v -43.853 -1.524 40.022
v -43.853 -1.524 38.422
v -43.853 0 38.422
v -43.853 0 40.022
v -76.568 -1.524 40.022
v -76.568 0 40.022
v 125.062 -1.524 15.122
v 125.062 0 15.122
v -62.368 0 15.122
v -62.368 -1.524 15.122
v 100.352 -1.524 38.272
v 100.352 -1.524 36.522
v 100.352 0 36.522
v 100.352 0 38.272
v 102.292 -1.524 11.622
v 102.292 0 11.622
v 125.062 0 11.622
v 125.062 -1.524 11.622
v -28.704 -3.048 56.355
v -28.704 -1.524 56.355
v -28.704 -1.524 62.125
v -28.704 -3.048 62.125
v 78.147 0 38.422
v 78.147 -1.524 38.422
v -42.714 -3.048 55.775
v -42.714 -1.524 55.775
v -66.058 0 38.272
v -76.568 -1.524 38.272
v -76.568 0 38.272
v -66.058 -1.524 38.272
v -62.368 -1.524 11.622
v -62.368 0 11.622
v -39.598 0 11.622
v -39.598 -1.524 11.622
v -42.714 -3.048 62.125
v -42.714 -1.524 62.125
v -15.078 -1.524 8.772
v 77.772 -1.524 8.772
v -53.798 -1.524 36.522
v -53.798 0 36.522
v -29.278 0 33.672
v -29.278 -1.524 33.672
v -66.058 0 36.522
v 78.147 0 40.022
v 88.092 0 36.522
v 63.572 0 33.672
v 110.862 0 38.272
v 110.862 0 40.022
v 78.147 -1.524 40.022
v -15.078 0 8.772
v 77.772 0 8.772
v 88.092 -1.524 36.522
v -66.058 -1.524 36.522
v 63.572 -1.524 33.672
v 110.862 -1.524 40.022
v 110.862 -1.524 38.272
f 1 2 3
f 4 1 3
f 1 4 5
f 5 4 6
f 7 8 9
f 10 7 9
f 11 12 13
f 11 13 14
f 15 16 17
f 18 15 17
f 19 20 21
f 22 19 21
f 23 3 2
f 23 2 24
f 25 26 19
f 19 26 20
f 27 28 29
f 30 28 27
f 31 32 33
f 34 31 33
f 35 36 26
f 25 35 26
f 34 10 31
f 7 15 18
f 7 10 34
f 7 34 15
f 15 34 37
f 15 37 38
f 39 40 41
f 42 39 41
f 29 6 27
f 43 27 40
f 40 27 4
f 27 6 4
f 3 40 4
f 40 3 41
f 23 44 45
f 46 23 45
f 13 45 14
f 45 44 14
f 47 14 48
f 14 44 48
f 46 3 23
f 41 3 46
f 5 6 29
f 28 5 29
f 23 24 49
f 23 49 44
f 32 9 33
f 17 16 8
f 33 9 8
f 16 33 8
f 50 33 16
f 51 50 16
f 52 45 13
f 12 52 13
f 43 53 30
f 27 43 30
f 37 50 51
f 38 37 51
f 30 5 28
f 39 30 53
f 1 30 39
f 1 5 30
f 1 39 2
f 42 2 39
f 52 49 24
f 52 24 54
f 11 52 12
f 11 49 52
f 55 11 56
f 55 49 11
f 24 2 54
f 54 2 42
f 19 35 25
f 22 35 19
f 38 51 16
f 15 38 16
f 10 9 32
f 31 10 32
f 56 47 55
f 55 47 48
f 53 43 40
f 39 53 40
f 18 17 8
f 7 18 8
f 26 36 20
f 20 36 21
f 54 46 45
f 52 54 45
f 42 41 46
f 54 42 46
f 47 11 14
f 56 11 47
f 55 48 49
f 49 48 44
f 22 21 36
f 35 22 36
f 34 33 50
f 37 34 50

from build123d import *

# Parameters (mm, degrees)
F1_DEPTH  = 1.524
F3_W      = 10.51
F3_H      = 1.75
F4_DEPTH  = 1.524
F5_W      = 10.51
F5_H      = 1.75
F6_DEPTH  = 1.524
F7_W      = 122
F7_H      = 1.524
F8_DEPTH  = 1.6
F10_DEPTH = 1.524


with BuildPart() as f1:
    # F0 (on Front) → F1 (new body)
    with BuildSketch(Plane.XZ):
        Polygon((125.0616679081, 15.1221710391), (-62.3683320919, 15.1221710391), (-62.3683320919, 11.6221710391), (-39.5983320919, 11.6221710391), (-15.0783320919, 8.7721710391), (77.7716679081, 8.7721710391), (102.2916679081, 11.6221710391), (125.0616679081, 11.6221710391), align=None)
    extrude(amount=F1_DEPTH)


with BuildPart() as f2_1:
    # F2: copy of F1
    add(f1.part.moved(Location((-14.2, 0, 24.9))))

    # F3 (on face) → F4 (cut)
    with BuildSketch(Plane.XZ.offset(1.524)):
        with Locations((-71.3133320919, 37.3971710391)):
            Rectangle(F3_W, F3_H)
    extrude(amount=-F4_DEPTH, mode=Mode.SUBTRACT)

    # F5 (on face) → F6 (cut)
    with BuildSketch(Plane.XZ.offset(1.524)):
        with Locations((105.6066679081, 37.3971710391)):
            Rectangle(F5_W, F5_H)
    extrude(amount=-F6_DEPTH, mode=Mode.SUBTRACT)

    # F7 (on face) → F8 (cut)
    with BuildSketch(Plane.XY.offset(40.0221710391)):
        with Locations((17.1466679081, -0.762)):
            Rectangle(F7_W, F7_H)
    extrude(amount=-F8_DEPTH, mode=Mode.SUBTRACT)


with BuildPart() as f10:
    # F9 (on face) → F10 (new body)
    with BuildSketch(Plane.XZ.offset(1.524)):
        Polygon((-28.704431866, 62.1248952341), (-42.714431866, 62.1248952341), (-42.714431866, 55.7748952341), (-28.704431866, 56.3548952341), align=None)
    extrude(amount=F10_DEPTH)


solid = Compound([f1.part, f2_1.part, f10.part])
